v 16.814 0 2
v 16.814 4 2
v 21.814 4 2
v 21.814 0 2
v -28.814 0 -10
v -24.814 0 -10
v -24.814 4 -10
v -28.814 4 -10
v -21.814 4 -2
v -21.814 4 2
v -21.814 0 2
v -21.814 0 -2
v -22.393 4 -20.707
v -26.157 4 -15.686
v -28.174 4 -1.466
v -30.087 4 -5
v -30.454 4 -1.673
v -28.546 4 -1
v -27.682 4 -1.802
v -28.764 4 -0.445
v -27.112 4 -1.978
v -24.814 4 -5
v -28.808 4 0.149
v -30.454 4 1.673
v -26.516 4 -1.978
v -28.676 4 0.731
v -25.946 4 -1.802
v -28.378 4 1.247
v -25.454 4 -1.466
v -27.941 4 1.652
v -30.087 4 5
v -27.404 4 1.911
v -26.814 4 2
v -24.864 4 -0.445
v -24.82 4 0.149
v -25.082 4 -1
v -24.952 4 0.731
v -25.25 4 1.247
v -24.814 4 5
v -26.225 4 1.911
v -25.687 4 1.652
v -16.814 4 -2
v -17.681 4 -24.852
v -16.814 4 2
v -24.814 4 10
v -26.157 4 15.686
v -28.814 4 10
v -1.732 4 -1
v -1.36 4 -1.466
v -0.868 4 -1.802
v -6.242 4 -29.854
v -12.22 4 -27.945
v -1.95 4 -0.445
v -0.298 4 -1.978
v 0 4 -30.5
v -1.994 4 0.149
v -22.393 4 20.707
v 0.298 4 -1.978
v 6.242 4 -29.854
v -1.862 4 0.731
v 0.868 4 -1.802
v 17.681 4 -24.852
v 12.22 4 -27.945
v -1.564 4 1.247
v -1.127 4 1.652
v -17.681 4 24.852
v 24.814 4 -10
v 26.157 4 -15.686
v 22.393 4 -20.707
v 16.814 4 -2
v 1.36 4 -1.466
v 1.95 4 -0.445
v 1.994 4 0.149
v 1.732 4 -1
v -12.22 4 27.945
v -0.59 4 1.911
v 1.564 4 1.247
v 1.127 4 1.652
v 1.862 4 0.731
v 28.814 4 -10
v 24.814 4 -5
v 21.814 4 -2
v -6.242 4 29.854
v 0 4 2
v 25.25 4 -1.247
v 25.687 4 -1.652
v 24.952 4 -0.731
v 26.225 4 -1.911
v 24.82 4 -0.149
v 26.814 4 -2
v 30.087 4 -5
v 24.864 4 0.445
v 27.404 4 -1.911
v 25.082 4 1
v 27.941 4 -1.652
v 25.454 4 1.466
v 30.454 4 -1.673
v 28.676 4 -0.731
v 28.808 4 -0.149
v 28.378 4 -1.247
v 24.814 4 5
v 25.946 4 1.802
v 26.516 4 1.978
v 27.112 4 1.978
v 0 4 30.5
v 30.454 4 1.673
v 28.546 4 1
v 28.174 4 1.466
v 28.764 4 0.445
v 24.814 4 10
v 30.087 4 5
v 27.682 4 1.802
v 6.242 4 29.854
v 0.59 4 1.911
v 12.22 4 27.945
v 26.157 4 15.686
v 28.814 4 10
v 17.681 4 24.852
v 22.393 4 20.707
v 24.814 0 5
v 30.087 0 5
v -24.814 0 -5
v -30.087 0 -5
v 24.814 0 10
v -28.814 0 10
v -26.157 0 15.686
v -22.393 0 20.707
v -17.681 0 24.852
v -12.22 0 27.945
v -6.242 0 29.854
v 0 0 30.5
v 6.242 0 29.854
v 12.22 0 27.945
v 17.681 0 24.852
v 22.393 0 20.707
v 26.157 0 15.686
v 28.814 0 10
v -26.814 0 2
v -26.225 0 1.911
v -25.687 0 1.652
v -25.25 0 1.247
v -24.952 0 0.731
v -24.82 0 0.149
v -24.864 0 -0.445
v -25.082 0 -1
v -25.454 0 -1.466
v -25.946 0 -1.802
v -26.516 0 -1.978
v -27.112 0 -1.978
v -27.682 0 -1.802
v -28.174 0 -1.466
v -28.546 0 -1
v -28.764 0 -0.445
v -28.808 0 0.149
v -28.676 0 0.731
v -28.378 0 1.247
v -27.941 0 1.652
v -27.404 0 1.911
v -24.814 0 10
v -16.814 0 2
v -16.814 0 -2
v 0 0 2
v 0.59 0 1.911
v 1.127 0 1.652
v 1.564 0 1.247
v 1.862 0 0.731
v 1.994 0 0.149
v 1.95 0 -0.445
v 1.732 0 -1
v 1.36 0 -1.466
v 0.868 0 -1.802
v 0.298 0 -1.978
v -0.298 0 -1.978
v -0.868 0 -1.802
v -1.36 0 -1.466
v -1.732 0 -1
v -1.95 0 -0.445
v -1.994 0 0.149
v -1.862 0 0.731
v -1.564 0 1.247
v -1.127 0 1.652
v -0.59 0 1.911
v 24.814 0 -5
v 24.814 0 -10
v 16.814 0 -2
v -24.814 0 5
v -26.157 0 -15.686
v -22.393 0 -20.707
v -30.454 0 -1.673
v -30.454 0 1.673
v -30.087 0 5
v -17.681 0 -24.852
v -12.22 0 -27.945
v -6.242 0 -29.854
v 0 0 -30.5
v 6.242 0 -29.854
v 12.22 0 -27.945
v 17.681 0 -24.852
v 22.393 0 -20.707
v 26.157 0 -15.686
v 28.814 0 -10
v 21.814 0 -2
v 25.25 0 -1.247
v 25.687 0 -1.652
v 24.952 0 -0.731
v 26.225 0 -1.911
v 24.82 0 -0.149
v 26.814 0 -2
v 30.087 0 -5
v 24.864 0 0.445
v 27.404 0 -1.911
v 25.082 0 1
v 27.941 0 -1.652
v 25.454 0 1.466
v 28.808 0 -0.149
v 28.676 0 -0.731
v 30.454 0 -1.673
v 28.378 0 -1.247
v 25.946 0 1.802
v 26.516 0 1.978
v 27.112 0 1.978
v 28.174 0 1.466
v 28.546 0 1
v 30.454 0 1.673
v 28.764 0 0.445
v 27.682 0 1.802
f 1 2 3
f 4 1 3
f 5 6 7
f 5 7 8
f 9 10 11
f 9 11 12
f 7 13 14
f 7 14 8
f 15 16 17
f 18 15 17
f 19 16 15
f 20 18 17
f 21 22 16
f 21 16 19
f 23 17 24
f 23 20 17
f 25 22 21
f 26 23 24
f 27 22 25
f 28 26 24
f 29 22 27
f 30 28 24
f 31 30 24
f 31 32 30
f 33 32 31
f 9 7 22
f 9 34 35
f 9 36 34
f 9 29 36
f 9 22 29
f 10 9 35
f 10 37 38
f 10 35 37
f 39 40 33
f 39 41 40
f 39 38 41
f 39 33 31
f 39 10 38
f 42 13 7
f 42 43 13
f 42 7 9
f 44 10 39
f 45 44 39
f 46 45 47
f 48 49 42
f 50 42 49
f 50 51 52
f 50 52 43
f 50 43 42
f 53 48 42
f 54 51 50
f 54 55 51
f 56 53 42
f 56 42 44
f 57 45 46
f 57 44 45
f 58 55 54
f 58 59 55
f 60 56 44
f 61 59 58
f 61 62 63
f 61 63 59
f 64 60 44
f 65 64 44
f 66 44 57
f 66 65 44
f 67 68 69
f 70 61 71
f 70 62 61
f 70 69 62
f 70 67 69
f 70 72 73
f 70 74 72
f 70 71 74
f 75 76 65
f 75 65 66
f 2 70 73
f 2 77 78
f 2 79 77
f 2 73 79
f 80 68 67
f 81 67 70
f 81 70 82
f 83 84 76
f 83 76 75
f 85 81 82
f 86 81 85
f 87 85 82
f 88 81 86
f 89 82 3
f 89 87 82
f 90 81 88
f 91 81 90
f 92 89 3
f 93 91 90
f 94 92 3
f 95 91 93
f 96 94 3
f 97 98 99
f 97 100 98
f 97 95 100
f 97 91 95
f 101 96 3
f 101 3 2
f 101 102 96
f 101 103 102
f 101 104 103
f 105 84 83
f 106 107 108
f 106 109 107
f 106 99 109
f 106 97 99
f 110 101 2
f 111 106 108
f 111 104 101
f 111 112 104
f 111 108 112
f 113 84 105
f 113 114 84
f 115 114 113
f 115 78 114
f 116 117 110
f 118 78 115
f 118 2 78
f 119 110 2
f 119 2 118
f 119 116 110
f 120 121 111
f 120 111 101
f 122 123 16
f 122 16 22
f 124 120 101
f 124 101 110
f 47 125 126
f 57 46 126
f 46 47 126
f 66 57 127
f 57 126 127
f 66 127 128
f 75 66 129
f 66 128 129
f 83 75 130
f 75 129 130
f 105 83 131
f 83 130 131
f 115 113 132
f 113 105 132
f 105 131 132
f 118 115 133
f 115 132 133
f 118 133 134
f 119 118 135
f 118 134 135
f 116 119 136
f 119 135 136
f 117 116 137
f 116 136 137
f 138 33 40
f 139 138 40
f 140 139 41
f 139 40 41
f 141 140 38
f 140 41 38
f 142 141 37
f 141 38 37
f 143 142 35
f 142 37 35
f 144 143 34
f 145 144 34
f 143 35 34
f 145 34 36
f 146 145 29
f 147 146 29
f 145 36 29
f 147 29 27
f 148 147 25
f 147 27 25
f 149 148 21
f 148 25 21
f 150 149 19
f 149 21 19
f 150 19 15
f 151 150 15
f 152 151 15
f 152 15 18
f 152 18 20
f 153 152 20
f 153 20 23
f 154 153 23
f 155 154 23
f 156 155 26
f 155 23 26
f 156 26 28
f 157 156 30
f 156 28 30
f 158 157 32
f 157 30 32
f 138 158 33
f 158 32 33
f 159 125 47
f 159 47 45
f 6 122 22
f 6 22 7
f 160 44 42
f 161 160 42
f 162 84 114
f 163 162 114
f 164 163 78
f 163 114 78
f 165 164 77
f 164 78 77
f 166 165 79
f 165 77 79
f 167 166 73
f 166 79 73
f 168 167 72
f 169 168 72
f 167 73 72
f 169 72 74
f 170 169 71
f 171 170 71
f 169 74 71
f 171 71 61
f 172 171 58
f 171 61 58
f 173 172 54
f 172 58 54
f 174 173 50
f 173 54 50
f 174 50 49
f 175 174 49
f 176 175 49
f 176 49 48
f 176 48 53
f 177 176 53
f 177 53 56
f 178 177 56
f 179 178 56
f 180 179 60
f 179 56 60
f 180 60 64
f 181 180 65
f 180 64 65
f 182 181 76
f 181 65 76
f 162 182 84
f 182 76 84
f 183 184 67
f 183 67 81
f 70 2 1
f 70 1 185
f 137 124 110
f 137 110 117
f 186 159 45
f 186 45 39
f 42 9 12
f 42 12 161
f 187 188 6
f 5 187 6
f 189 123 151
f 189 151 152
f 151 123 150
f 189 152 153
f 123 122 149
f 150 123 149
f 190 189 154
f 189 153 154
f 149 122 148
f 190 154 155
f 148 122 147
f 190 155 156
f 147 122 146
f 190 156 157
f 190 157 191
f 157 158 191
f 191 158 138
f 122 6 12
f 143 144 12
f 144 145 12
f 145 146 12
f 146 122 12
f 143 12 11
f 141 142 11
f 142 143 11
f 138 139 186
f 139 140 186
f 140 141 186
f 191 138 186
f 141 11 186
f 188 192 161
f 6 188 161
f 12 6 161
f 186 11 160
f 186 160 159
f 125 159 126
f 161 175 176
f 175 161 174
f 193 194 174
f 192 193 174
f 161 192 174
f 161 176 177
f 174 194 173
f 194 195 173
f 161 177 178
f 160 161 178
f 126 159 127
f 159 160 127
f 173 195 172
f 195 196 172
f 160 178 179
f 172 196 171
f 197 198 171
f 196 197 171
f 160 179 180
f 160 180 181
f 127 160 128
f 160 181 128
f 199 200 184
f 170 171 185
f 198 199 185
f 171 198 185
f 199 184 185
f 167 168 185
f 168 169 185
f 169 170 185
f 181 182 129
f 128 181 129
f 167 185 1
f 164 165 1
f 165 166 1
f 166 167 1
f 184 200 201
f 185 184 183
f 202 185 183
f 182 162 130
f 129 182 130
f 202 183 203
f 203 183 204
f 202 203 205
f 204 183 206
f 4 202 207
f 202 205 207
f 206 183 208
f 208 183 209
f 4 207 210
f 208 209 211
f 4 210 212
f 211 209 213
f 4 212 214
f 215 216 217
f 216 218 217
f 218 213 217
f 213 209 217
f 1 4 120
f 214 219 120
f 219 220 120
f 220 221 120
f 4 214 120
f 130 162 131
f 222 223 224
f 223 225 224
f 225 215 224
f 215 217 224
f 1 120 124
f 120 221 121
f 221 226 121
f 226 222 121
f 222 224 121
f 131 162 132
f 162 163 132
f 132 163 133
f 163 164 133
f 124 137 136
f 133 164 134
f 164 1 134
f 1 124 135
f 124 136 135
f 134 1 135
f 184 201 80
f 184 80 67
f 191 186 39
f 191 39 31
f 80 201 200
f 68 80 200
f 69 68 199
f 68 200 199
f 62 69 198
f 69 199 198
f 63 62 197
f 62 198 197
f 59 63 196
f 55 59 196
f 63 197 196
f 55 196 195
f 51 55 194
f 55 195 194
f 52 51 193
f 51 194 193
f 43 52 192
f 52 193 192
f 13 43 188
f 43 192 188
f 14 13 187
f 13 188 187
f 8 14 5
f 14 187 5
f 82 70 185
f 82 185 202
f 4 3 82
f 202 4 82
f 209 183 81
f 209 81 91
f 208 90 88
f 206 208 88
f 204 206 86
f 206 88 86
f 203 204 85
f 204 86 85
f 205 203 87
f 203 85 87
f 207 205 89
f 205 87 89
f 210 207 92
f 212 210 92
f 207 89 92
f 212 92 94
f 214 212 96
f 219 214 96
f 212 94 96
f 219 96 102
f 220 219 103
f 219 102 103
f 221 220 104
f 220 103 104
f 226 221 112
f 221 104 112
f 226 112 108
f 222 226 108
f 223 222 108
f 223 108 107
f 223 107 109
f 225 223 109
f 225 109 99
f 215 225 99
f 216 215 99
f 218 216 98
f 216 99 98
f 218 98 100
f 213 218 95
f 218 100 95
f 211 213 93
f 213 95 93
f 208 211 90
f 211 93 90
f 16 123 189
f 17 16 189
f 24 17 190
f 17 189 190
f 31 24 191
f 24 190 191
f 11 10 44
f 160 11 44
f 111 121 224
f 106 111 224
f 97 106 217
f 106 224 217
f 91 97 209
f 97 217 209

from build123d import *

# Parameters (mm, degrees)
CROQUIS1_R              = 30.5
SALIENTE_EXTRUIR1_DEPTH = 4
CROQUIS2_R              = 2
CORTAR_EXTRUIR1_DEPTH   = 4
CORTAR_EXTRUIR3_START   = -4
CORTAR_EXTRUIR3_DEPTH   = 4
CROQUIS6_W              = 5
CROQUIS6_H              = 4
CORTAR_EXTRUIR4_DEPTH   = 4
CROQUIS7_R              = 2
CORTAR_EXTRUIR5_DEPTH   = 4


with BuildPart() as part:
    # Croquis1 → Saliente-Extruir1 (new body)
    with BuildSketch(Plane(origin=(0, 0, 0), x_dir=(1, 0, 0), z_dir=(0, 1, 0))):
        with Locations(Location((0, 0, 0), (0, 0, 270))):
            Circle(CROQUIS1_R)
    extrude(amount=SALIENTE_EXTRUIR1_DEPTH)

    # Croquis2 → Cortar-Extruir1 (cut)
    with BuildSketch(Plane(origin=(0, 4, 0), x_dir=(1, 0, 0), z_dir=(0, 1, 0))):
        with Locations(Location((0, 0, 0), (0, 0, 270))):
            Circle(CROQUIS2_R)
    extrude(amount=-CORTAR_EXTRUIR1_DEPTH, mode=Mode.SUBTRACT)

    # Croquis5 → Cortar-Extruir3 (cut)
    with BuildSketch(Plane(origin=(0, 4, 0), x_dir=(1, 0, 0), z_dir=(0, 1, 0)).offset(CORTAR_EXTRUIR3_START)):
        with BuildLine():
            Line((28.814059068, 5), (30.087372767, 5))
            ThreePointArc((30.087372767, 5), (29.556634924, 7.526973624), (28.814059068, 10))
            Line((28.814059068, 10), (24.814059068, 10))
            Line((24.814059068, 10), (24.814059068, 5))
            Line((24.814059068, 5), (28.814059068, 5))
        make_face()
        with BuildLine():
            Line((30.087372767, -5), (28.814059068, -5))
            Line((28.814059068, -5), (24.814059068, -5))
            Line((24.814059068, -5), (24.814059068, -10))
            Line((24.814059068, -10), (28.814059068, -10))
            ThreePointArc((28.814059068, -10), (29.556634924, -7.526973624), (30.087372767, -5))
        make_face()
        with BuildLine():
            Line((-24.814059068, 5), (-24.814059068, 10))
            Line((-24.814059068, 10), (-28.814059068, 10))
            ThreePointArc((-28.814059068, 10), (-29.556634924, 7.526973624), (-30.087372767, 5))
            Line((-30.087372767, 5), (-28.814059068, 5))
            Line((-28.814059068, 5), (-24.814059068, 5))
        make_face()
        with BuildLine():
            Line((-28.814059068, -10), (-24.814059068, -10))
            Line((-24.814059068, -10), (-24.814059068, -5))
            Line((-24.814059068, -5), (-28.814059068, -5))
            Line((-28.814059068, -5), (-30.087372767, -5))
            ThreePointArc((-30.087372767, -5), (-29.556634924, -7.526973624), (-28.814059068, -10))
        make_face()
    extrude(amount=CORTAR_EXTRUIR3_DEPTH, mode=Mode.SUBTRACT)

    # Croquis6 → Cortar-Extruir4 (cut)
    with BuildSketch(Plane(origin=(0, 4, 0), x_dir=(1, 0, 0), z_dir=(0, 1, 0))):
        with Locations((-19.314059068, 0)):
            Rectangle(CROQUIS6_W, CROQUIS6_H)
        with Locations((19.314059068, 0)):
            Rectangle(CROQUIS6_W, CROQUIS6_H)
    extrude(amount=-CORTAR_EXTRUIR4_DEPTH, mode=Mode.SUBTRACT)

    # Croquis7 → Cortar-Extruir5 (cut)
    with BuildSketch(Plane(origin=(0, 4, 0), x_dir=(1, 0, 0), z_dir=(0, 1, 0))):
        with Locations(Location((-26.814059068, 0, 0), (0, 0, 270))):
            Circle(CROQUIS7_R)
        with Locations(Location((26.814059068, 0, 0), (0, 0, 90))):
            Circle(CROQUIS7_R)
    extrude(amount=-CORTAR_EXTRUIR5_DEPTH, mode=Mode.SUBTRACT)


solid = part.part
